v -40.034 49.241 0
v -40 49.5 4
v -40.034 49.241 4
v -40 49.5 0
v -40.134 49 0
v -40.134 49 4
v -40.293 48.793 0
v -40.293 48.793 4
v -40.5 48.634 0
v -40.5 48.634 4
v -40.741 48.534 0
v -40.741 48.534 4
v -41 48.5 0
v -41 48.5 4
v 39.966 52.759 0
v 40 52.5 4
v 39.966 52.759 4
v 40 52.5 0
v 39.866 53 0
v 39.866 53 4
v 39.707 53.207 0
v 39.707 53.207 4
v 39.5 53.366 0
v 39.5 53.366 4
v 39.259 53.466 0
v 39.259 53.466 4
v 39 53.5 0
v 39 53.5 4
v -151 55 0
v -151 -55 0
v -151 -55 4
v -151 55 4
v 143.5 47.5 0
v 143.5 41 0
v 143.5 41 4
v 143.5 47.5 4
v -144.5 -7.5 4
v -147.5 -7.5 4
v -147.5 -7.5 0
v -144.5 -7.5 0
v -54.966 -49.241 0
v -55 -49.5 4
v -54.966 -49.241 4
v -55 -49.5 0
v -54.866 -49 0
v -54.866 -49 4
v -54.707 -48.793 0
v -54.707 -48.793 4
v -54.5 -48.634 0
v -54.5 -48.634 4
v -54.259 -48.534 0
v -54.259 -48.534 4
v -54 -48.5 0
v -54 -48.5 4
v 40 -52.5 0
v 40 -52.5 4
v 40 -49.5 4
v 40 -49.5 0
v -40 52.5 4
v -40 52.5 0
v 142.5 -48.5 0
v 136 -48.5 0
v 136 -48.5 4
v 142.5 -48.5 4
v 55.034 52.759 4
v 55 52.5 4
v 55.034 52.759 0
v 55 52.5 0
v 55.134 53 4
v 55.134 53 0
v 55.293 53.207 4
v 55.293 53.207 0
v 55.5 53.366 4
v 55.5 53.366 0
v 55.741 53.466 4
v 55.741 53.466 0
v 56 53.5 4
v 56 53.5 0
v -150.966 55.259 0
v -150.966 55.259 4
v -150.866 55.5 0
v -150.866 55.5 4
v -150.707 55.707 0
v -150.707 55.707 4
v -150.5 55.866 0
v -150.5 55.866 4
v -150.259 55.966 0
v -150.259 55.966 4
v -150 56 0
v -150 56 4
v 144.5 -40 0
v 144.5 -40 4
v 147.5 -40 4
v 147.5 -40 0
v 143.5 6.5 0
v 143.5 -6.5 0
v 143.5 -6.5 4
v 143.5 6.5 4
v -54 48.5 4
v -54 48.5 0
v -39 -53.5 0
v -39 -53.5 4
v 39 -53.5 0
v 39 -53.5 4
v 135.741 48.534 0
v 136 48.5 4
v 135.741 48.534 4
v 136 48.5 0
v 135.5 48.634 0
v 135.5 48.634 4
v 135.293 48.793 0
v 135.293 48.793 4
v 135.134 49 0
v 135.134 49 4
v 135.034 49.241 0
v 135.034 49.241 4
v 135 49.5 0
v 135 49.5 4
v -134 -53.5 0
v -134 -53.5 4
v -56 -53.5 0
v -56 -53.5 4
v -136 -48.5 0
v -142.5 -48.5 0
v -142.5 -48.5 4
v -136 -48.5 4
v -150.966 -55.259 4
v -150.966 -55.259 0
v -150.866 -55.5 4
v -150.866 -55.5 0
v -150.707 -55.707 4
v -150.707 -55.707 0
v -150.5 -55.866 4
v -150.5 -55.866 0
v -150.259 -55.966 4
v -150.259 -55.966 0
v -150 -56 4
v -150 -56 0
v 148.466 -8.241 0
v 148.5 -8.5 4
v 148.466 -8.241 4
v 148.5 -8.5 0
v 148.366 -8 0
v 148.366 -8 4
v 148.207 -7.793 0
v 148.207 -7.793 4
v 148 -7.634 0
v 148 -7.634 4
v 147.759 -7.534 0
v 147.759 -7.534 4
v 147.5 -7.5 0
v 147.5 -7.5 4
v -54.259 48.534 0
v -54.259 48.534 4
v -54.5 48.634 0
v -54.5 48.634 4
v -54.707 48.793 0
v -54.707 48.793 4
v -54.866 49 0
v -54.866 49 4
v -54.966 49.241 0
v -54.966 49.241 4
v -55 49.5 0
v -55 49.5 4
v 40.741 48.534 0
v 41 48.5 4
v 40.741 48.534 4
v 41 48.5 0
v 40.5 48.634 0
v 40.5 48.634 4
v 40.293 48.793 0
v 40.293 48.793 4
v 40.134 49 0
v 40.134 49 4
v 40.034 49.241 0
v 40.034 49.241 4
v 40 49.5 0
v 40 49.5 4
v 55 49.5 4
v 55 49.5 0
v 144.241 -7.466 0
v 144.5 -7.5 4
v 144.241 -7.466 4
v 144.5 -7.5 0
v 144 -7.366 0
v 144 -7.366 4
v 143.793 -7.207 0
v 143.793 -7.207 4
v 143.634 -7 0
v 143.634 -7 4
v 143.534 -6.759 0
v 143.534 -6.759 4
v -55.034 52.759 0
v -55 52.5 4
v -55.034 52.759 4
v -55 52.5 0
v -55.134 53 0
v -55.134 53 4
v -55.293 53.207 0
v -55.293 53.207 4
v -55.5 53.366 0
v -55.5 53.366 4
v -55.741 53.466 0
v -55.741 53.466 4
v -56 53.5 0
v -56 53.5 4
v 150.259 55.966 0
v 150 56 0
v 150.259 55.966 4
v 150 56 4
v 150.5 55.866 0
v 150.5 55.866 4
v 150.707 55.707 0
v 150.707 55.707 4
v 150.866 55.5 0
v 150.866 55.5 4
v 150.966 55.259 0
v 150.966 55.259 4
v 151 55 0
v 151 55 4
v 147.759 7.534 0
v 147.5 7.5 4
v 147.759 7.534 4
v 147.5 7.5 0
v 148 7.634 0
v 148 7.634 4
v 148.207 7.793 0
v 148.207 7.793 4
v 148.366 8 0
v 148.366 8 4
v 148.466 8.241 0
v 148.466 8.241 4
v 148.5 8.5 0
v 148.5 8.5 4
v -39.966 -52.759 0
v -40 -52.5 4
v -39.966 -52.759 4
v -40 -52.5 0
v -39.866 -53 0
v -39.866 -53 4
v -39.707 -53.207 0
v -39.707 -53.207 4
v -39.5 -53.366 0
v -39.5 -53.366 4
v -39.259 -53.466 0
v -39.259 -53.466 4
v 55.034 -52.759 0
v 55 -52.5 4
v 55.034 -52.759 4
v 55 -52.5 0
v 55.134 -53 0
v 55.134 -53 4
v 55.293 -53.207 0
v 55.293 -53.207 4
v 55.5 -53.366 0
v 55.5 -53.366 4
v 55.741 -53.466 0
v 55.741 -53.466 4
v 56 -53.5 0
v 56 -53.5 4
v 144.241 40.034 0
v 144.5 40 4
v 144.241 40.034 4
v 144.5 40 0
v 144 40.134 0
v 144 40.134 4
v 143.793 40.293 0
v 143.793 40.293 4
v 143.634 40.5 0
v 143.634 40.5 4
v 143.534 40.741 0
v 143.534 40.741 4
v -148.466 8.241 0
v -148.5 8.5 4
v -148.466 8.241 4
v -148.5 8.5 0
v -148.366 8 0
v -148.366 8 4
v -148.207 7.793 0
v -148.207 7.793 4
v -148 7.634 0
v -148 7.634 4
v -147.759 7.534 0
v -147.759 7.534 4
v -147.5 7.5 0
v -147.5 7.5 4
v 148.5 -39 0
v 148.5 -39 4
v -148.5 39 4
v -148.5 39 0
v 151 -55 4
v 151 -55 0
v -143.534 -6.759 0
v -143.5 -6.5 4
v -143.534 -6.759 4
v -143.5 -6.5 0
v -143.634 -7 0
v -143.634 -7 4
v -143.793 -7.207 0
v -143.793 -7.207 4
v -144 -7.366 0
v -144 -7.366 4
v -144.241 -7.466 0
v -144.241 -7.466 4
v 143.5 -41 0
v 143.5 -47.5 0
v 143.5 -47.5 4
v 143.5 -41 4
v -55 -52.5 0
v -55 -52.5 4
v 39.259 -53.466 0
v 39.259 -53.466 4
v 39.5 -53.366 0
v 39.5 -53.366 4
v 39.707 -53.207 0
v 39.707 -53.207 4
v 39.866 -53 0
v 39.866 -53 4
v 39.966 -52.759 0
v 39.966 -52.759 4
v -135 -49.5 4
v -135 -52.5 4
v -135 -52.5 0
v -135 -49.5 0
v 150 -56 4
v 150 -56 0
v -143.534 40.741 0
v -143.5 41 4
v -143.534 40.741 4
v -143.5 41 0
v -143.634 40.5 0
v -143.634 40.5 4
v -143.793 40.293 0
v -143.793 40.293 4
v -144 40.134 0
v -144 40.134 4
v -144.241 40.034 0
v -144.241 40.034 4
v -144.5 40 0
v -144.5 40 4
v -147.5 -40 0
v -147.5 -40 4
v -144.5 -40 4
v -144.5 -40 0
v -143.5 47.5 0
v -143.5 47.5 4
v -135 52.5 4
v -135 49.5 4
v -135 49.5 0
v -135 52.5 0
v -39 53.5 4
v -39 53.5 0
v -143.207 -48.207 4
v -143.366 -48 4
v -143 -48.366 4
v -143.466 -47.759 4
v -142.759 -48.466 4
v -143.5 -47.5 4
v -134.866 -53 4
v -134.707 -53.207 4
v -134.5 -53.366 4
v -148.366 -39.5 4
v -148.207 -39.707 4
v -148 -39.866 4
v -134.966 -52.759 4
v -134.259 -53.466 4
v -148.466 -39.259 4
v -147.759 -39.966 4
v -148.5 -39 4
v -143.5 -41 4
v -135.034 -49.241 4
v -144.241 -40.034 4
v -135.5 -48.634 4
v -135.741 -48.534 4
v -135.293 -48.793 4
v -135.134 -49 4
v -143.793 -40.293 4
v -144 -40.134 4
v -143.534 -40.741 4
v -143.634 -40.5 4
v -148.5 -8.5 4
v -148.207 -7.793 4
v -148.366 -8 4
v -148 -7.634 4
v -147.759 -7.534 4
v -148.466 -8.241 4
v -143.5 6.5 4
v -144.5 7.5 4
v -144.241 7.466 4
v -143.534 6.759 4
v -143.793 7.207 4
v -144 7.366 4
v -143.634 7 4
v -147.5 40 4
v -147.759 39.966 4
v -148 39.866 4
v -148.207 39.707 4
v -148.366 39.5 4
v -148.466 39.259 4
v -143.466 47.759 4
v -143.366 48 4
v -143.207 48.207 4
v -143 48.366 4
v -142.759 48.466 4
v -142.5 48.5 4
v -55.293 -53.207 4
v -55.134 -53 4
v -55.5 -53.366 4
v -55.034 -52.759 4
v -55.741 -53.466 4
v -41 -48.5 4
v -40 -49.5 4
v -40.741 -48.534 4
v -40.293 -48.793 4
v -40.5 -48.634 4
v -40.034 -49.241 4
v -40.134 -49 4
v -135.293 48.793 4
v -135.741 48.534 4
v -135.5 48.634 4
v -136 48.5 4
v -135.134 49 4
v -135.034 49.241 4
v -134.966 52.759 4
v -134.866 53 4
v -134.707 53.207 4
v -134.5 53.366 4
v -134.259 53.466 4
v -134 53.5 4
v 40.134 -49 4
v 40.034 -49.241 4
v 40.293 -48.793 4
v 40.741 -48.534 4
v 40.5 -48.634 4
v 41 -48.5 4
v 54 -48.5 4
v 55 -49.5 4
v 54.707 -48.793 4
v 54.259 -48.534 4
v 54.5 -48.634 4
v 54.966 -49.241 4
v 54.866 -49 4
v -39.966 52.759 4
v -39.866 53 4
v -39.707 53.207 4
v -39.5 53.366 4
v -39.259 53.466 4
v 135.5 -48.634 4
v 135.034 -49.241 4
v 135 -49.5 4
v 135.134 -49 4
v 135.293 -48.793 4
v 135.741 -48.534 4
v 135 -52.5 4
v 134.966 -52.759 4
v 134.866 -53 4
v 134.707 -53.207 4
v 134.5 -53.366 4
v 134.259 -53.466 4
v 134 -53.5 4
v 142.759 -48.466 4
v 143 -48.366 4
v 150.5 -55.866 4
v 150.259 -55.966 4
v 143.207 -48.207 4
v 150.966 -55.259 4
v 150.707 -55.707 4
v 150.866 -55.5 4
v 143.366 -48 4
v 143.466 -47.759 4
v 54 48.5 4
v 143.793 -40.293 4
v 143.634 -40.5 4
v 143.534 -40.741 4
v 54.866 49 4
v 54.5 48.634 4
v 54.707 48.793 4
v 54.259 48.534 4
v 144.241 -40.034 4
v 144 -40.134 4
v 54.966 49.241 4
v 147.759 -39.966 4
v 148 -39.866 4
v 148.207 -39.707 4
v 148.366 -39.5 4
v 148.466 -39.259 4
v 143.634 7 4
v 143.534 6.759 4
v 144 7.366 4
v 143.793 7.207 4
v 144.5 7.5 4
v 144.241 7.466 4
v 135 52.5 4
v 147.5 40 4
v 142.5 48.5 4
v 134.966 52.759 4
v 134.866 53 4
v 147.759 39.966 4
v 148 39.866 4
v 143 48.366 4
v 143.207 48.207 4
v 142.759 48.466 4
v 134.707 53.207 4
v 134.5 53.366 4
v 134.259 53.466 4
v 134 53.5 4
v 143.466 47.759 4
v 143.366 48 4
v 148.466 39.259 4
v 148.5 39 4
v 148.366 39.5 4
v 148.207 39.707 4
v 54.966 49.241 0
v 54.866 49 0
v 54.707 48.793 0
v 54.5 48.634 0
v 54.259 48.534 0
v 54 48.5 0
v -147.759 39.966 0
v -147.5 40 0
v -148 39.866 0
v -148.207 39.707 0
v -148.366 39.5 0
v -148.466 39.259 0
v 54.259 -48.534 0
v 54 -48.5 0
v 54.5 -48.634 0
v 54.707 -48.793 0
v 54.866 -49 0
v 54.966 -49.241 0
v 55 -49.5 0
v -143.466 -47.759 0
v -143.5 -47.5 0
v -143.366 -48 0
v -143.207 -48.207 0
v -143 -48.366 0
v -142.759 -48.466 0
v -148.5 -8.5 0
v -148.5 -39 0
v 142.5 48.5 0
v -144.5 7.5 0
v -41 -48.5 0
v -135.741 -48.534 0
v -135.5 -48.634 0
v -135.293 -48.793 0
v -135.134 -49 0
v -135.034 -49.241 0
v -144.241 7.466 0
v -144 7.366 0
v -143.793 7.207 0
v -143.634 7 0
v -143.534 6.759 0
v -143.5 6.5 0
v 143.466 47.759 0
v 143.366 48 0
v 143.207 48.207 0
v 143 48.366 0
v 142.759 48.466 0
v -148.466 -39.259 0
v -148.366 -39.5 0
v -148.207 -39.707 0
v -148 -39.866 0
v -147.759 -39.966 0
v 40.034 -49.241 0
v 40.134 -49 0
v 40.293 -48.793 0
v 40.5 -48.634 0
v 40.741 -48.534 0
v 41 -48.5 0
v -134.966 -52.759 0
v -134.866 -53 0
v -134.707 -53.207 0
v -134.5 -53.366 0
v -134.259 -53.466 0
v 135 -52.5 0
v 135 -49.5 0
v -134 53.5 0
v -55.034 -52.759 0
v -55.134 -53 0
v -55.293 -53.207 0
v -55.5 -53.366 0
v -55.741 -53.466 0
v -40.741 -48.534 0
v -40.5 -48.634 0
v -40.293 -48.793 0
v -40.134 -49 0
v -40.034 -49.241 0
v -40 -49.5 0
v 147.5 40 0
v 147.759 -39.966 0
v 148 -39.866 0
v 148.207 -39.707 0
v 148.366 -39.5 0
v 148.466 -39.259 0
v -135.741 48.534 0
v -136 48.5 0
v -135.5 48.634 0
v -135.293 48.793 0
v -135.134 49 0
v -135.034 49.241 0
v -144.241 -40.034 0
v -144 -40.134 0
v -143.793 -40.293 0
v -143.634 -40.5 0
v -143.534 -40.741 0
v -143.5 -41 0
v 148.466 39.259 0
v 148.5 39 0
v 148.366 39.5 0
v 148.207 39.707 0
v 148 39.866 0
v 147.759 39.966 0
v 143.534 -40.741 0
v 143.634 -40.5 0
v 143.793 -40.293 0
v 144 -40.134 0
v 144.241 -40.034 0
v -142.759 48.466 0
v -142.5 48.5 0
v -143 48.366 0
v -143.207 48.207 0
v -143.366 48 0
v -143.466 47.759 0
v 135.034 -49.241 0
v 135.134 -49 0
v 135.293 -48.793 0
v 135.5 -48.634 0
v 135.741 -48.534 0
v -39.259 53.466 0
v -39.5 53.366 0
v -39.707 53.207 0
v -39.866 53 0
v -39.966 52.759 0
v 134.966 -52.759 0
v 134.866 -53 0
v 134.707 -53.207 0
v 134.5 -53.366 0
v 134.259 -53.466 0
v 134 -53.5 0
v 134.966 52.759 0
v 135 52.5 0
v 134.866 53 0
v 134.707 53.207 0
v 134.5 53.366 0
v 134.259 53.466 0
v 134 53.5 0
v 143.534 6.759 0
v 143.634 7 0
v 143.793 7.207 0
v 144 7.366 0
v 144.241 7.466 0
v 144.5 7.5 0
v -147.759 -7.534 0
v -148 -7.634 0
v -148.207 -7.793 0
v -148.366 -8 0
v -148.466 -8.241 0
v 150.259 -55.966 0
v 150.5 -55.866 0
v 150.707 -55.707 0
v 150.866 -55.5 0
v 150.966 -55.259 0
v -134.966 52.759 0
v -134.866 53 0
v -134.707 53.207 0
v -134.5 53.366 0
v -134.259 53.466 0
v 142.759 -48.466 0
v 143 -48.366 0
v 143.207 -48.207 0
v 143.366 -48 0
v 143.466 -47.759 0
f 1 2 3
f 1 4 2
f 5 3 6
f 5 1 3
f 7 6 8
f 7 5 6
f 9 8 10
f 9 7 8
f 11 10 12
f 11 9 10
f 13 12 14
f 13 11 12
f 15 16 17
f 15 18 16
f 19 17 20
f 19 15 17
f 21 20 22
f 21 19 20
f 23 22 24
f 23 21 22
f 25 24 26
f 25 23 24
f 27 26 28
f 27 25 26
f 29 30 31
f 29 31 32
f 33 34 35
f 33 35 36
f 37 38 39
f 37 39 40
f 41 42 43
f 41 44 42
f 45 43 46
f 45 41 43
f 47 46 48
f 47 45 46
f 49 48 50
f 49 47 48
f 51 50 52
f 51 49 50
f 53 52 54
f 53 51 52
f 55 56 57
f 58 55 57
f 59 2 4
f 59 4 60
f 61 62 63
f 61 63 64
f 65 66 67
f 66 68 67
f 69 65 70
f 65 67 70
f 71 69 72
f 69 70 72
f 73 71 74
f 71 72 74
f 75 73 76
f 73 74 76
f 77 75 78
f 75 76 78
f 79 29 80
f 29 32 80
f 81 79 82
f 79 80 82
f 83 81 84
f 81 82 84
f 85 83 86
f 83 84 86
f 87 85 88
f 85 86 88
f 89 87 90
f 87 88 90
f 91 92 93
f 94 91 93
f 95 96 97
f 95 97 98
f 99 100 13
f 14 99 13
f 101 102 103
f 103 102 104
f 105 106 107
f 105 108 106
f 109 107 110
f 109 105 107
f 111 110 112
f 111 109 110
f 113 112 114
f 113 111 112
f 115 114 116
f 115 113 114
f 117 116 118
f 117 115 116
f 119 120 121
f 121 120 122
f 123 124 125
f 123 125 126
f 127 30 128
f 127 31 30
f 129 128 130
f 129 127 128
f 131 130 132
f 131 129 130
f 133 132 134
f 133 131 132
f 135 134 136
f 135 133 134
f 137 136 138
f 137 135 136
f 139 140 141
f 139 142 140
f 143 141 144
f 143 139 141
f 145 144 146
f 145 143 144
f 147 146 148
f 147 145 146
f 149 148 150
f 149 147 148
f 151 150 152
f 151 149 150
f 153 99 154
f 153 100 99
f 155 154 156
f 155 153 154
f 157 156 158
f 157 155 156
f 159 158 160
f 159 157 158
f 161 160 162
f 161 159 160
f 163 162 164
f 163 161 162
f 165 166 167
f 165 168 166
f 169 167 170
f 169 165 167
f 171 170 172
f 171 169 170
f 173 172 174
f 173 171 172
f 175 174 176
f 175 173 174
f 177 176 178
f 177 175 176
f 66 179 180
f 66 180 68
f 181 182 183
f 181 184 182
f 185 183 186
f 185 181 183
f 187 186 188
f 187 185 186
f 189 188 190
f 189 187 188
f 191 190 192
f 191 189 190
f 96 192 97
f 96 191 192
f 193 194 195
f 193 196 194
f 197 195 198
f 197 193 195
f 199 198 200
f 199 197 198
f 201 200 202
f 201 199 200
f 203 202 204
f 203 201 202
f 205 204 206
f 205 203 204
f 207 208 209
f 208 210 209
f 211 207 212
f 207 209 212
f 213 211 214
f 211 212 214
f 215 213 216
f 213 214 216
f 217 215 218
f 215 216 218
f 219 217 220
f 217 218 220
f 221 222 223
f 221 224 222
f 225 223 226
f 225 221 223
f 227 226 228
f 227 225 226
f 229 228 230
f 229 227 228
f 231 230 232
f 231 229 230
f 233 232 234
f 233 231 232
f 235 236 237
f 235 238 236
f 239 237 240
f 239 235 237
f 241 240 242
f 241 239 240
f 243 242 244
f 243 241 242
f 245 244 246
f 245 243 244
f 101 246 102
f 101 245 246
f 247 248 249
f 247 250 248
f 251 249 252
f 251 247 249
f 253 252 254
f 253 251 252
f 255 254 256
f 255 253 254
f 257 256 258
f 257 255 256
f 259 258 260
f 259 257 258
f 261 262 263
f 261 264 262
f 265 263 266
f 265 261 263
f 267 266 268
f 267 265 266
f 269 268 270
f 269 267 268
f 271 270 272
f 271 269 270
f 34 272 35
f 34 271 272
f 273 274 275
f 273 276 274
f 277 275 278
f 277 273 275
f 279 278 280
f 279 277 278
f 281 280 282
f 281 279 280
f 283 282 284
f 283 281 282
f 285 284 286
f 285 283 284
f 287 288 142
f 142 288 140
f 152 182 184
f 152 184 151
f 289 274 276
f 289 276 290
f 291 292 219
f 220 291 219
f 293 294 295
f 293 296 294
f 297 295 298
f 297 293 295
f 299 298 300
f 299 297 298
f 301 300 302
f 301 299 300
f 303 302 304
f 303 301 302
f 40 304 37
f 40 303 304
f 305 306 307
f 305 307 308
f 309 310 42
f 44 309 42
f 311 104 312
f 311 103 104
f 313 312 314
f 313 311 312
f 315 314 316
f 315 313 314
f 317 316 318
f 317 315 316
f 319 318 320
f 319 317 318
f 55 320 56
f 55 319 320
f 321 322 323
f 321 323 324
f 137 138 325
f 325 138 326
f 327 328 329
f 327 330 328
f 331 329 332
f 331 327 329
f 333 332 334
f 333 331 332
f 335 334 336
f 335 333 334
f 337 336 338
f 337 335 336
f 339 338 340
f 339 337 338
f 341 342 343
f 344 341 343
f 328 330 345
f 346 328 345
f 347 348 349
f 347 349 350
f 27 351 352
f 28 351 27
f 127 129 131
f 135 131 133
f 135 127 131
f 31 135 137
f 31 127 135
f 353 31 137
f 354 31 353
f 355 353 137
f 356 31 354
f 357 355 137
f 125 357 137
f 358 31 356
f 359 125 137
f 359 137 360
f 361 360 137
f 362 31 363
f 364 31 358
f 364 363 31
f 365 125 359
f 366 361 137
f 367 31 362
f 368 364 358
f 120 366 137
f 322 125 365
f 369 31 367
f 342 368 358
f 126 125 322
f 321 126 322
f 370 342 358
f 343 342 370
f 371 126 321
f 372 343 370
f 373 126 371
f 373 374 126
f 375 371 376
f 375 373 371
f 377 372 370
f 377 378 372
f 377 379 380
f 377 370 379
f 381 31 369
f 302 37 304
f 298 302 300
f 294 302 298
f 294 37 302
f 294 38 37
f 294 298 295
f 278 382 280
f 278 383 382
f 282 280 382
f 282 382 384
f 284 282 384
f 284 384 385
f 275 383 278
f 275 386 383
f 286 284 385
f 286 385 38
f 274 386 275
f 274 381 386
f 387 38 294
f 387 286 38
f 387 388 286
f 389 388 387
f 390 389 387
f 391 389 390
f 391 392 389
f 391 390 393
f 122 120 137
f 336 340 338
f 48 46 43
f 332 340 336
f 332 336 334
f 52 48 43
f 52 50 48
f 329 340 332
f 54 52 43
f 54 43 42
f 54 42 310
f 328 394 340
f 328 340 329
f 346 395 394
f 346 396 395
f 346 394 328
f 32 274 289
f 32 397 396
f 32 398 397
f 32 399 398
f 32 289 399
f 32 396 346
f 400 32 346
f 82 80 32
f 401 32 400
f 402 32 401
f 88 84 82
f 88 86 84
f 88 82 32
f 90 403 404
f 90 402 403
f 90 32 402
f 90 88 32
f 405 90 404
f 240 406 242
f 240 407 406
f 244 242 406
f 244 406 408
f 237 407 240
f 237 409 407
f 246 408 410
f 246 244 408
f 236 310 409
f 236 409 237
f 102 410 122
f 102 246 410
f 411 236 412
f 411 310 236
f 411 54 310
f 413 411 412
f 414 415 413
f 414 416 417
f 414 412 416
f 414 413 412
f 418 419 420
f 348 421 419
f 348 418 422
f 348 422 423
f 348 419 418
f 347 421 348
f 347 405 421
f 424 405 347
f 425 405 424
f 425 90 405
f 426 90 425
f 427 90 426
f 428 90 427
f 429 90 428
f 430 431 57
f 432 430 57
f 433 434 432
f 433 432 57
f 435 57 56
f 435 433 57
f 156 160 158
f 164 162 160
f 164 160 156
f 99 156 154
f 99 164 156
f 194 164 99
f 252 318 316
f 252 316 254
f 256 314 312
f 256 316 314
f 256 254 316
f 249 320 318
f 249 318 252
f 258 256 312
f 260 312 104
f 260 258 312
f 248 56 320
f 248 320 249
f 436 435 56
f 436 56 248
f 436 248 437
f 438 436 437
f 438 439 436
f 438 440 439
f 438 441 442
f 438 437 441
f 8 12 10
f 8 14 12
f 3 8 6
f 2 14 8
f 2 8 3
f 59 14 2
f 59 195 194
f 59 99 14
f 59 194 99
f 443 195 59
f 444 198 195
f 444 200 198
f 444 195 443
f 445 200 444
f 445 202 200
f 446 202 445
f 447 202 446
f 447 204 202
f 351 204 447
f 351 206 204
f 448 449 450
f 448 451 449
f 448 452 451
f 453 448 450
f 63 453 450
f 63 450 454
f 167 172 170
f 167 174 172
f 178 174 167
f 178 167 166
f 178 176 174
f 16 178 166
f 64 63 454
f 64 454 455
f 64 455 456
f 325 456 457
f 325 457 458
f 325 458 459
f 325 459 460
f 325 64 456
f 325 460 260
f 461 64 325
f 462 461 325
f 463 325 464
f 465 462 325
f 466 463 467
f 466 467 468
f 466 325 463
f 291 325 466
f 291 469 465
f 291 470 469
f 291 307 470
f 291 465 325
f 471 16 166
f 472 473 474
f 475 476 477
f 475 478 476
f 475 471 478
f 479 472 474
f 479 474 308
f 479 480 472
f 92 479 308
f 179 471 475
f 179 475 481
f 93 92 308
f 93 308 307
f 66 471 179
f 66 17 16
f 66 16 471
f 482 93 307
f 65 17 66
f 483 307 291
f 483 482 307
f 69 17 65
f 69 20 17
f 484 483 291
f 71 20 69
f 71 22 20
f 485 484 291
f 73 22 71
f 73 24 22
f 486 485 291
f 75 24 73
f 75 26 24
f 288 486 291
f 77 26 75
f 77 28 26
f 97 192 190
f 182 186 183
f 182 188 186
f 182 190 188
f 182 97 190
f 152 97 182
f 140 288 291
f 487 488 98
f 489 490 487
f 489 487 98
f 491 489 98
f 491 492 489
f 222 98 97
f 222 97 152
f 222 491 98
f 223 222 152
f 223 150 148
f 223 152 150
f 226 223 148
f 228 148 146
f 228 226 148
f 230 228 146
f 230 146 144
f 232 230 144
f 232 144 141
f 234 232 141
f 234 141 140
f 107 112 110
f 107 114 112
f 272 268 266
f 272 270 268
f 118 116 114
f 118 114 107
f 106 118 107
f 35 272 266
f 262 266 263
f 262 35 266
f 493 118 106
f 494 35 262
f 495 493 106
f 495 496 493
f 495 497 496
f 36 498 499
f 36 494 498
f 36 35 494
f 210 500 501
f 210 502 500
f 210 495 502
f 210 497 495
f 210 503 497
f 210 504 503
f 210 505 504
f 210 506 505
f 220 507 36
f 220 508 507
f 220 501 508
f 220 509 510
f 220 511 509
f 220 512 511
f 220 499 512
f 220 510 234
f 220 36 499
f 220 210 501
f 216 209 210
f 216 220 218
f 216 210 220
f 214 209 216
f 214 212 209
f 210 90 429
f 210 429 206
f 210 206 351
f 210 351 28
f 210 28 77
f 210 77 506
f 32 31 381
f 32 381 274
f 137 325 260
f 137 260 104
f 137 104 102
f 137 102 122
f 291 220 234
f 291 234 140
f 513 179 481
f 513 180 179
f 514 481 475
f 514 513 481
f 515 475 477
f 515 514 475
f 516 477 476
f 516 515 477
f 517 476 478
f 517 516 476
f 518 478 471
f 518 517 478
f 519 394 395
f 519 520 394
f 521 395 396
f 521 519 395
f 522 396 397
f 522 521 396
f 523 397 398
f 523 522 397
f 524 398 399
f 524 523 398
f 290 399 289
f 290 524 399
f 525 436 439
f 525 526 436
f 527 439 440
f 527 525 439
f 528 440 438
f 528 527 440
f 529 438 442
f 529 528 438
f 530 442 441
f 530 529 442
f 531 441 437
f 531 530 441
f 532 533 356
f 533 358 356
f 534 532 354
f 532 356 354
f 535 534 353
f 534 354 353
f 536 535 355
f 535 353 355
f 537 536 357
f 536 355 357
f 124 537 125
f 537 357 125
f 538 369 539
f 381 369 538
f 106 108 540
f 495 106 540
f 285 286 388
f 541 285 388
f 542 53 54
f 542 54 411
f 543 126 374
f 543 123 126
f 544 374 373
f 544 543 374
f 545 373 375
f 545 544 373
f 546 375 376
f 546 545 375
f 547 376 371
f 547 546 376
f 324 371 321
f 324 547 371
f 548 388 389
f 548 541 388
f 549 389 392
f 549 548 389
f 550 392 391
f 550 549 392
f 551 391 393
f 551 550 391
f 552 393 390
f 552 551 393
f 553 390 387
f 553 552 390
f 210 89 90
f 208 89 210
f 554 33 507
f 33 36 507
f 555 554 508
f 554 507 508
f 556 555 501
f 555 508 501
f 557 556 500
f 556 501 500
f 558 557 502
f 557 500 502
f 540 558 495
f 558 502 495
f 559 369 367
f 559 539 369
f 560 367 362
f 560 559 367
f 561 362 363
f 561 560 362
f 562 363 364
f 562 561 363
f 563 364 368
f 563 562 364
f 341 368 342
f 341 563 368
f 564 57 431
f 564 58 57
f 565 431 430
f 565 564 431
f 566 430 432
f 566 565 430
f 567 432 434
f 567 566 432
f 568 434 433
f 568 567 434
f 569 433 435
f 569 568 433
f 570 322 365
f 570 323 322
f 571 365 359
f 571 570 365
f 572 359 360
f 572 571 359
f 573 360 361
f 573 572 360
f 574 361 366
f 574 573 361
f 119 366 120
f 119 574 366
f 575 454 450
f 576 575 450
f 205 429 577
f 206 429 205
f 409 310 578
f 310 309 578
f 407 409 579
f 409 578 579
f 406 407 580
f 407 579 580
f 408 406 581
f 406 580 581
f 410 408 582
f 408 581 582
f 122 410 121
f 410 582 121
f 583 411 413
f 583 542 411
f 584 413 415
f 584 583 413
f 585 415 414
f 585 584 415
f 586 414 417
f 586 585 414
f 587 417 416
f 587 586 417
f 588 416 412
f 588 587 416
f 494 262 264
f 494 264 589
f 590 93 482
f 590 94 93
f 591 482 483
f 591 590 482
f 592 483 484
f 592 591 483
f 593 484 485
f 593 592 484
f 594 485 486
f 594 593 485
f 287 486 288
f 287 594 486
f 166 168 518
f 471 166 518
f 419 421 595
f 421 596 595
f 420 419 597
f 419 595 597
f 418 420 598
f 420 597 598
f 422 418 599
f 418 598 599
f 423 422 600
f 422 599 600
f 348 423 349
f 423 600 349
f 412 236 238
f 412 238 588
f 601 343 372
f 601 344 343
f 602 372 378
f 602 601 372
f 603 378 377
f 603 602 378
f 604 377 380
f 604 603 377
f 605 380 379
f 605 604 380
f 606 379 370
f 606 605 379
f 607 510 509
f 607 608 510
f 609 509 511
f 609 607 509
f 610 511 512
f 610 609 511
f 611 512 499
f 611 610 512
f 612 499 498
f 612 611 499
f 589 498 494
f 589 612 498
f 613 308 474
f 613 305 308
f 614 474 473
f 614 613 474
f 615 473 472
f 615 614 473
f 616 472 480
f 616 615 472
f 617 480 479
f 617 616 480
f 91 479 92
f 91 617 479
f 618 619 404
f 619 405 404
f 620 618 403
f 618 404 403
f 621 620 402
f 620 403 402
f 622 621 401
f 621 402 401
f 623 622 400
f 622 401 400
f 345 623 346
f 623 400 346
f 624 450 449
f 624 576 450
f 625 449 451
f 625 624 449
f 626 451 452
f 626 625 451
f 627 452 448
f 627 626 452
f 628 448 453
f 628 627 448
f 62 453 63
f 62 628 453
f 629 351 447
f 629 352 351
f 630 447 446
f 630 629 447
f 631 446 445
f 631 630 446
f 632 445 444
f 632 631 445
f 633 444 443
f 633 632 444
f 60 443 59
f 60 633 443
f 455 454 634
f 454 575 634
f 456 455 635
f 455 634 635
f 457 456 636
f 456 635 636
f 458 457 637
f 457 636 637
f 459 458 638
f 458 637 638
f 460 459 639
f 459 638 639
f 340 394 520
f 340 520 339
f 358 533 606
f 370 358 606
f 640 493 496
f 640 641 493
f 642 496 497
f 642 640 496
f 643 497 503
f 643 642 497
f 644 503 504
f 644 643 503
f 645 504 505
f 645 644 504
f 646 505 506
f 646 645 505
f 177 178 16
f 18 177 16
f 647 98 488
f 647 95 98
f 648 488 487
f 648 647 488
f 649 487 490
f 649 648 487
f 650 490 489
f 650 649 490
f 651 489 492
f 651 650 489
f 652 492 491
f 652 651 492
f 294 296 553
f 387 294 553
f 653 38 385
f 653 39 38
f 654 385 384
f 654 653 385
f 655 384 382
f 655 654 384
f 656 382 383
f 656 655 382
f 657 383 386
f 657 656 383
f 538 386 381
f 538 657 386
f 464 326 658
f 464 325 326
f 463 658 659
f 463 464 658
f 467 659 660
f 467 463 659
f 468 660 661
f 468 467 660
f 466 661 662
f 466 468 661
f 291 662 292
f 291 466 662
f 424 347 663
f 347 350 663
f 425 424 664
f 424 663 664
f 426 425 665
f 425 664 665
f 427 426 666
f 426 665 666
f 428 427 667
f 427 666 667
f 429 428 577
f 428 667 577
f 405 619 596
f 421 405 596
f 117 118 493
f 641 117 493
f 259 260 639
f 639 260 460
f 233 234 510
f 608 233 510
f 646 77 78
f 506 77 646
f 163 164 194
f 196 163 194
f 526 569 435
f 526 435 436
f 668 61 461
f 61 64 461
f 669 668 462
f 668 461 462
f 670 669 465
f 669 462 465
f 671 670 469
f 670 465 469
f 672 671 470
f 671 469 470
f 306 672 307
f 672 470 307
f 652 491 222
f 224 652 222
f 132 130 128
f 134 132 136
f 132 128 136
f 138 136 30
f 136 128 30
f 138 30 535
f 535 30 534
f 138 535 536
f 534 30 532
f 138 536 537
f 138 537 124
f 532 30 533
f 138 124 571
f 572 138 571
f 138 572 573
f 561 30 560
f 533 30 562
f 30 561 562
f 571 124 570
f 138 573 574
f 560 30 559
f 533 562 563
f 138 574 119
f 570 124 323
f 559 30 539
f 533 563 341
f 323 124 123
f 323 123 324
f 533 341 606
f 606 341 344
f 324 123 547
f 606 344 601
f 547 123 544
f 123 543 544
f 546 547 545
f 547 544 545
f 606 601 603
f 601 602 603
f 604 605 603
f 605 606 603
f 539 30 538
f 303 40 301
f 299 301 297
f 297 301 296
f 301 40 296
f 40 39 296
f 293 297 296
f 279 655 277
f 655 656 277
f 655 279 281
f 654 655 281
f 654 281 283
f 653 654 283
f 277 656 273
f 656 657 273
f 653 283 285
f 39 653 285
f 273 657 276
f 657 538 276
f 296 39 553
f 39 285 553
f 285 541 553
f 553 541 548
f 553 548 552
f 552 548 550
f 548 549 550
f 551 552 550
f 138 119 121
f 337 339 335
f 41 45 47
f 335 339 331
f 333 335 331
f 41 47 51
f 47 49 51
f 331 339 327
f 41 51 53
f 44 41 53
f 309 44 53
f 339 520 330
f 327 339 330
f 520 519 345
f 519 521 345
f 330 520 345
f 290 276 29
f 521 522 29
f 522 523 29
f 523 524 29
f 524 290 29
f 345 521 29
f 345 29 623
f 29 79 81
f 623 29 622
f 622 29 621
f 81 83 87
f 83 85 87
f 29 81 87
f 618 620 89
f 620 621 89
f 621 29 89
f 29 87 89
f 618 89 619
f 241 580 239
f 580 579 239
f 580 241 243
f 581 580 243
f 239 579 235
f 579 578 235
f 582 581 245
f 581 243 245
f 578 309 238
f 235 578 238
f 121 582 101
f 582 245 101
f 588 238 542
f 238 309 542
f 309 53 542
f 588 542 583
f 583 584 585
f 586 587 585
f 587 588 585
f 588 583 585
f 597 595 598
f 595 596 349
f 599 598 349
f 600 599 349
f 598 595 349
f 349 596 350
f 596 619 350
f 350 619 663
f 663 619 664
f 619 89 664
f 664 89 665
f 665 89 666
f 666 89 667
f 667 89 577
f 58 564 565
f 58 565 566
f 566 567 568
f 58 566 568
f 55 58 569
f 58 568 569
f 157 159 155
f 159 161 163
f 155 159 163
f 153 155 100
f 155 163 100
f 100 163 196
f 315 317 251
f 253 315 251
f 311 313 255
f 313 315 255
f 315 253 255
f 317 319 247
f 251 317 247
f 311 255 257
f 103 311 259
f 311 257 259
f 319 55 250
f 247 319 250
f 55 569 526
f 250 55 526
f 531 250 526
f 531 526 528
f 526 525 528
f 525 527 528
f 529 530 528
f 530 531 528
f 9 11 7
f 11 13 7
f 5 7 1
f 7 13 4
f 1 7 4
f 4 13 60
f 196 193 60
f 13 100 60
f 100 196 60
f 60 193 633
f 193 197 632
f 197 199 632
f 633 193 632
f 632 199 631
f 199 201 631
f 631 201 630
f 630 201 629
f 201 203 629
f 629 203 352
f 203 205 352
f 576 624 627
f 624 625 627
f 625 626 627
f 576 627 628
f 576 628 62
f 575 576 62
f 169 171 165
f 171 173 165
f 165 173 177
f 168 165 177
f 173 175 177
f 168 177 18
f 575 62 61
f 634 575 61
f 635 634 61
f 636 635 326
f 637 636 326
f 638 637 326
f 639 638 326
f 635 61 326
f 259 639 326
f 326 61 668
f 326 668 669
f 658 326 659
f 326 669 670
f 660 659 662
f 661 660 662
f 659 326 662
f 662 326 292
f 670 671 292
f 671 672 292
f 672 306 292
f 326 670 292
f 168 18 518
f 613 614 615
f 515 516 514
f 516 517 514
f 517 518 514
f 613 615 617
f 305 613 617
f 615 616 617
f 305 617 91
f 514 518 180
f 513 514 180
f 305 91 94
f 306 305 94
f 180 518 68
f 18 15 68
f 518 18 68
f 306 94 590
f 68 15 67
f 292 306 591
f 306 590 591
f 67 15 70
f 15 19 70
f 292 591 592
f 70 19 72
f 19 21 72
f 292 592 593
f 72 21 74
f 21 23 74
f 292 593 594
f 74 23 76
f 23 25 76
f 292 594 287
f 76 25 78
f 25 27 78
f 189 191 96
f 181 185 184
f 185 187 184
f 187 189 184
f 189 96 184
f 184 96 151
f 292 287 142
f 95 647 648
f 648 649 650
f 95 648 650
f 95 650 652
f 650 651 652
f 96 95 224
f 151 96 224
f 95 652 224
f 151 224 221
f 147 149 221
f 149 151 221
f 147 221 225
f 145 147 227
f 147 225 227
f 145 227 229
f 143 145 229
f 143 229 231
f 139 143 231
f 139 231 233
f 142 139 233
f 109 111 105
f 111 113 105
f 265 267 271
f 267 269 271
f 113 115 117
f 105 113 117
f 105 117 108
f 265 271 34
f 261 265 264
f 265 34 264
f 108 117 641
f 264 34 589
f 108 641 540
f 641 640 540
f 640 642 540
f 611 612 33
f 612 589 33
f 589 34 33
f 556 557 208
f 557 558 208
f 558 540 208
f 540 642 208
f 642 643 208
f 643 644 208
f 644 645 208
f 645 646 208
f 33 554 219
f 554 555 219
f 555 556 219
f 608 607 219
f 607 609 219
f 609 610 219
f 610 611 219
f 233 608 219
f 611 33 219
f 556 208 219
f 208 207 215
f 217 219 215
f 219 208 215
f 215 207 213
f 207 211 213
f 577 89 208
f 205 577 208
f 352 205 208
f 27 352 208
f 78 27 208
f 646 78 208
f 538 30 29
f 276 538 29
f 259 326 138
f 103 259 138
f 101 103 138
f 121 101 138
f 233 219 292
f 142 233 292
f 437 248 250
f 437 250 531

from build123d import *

# Parameters (mm, degrees)
SKETCH_W      = 302
SKETCH_H      = 112
SKETCH_W_2    = 287
SKETCH_H_2    = 97
PAD_DEPTH     = 4
SKETCH001_W   = 80
SKETCH001_H   = 5
SKETCH001_W_2 = 5
SKETCH001_H_2 = 32.5
POCKET_DEPTH  = 5
FILLET_R      = 1
FILLET001_R   = 1
FILLET002_R   = 1
FILLET003_R   = 1
FILLET004_R   = 1
FILLET005_R   = 1
FILLET006_R   = 1
FILLET007_R   = 1
FILLET008_R   = 1
FILLET009_R   = 1
FILLET010_R   = 1
FILLET011_R   = 1
FILLET012_R   = 1
FILLET013_R   = 1
FILLET014_R   = 1
FILLET015_R   = 1
FILLET016_R   = 1
FILLET017_R   = 1
FILLET018_R   = 1
FILLET019_R   = 1
FILLET020_R   = 1
FILLET021_R   = 1
FILLET022_R   = 1
FILLET023_R   = 1
FILLET024_R   = 1
FILLET025_R   = 1
FILLET026_R   = 1
FILLET027_R   = 1
FILLET028_R   = 1
FILLET029_R   = 1
FILLET030_R   = 1
FILLET031_R   = 1
FILLET032_R   = 1
FILLET033_R   = 1
FILLET034_R   = 1
FILLET035_R   = 1
FILLET036_R   = 1
FILLET037_R   = 1
FILLET038_R   = 1
FILLET039_R   = 1
FILLET040_R   = 1
FILLET041_R   = 1
FILLET042_R   = 1
FILLET043_R   = 1
FILLET044_R   = 1
FILLET045_R   = 1
FILLET046_R   = 1
FILLET047_R   = 1


with BuildPart() as part:
    # Sketch → Pad (new body)
    with BuildSketch(Plane.XY):
        Rectangle(SKETCH_W, SKETCH_H)
        Rectangle(SKETCH_W_2, SKETCH_H_2, mode=Mode.SUBTRACT)
    extrude(amount=PAD_DEPTH)

    # Sketch001 (on Face10 of Pad) → Pocket (cut)
    with BuildSketch(Plane.XY.offset(4)):
        with Locations((0, 51)):
            Rectangle(SKETCH001_W, SKETCH001_H)
        with Locations((0, -51)):
            Rectangle(SKETCH001_W, SKETCH001_H)
        with Locations((-95, -51)):
            Rectangle(SKETCH001_W, SKETCH001_H)
        with Locations((-95, 51)):
            Rectangle(SKETCH001_W, SKETCH001_H)
        with Locations((95, 51)):
            Rectangle(SKETCH001_W, SKETCH001_H)
        with Locations((95, -51)):
            Rectangle(SKETCH001_W, SKETCH001_H)
        with Locations((-146, 23.75)):
            Rectangle(SKETCH001_W_2, SKETCH001_H_2)
        with Locations((-146, -23.75)):
            Rectangle(SKETCH001_W_2, SKETCH001_H_2)
        with Locations((146, 23.75)):
            Rectangle(SKETCH001_W_2, SKETCH001_H_2)
        with Locations((146, -23.75)):
            Rectangle(SKETCH001_W_2, SKETCH001_H_2)
    extrude(amount=-POCKET_DEPTH, mode=Mode.SUBTRACT)

    # Fillet
    fillet_edges = [part.edges().sort_by_distance(p)[0] for p in [
        (-151, -56, 2),
    ]]
    fillet(fillet_edges, radius=FILLET_R)

    # Fillet001
    fillet001_edges = [part.edges().sort_by_distance(p)[0] for p in [
        (-143.5, -7.5, 2),
    ]]
    fillet(fillet001_edges, radius=FILLET001_R)

    # Fillet002
    fillet002_edges = [part.edges().sort_by_distance(p)[0] for p in [
        (-55, -48.5, 2),
    ]]
    fillet(fillet002_edges, radius=FILLET002_R)

    # Fillet003
    fillet003_edges = [part.edges().sort_by_distance(p)[0] for p in [
        (40, -48.5, 2),
    ]]
    fillet(fillet003_edges, radius=FILLET003_R)

    # Fillet004
    fillet004_edges = [part.edges().sort_by_distance(p)[0] for p in [
        (135, -48.5, 2),
    ]]
    fillet(fillet004_edges, radius=FILLET004_R)

    # Fillet005
    fillet005_edges = [part.edges().sort_by_distance(p)[0] for p in [
        (143.5, -40, 2),
    ]]
    fillet(fillet005_edges, radius=FILLET005_R)

    # Fillet006
    fillet006_edges = [part.edges().sort_by_distance(p)[0] for p in [
        (151, -56, 2),
    ]]
    fillet(fillet006_edges, radius=FILLET006_R)

    # Fillet007
    fillet007_edges = [part.edges().sort_by_distance(p)[0] for p in [
        (148.5, -7.5, 2),
    ]]
    fillet(fillet007_edges, radius=FILLET007_R)

    # Fillet008
    fillet008_edges = [part.edges().sort_by_distance(p)[0] for p in [
        (143.5, -7.5, 2),
    ]]
    fillet(fillet008_edges, radius=FILLET008_R)

    # Fillet009
    fillet009_edges = [part.edges().sort_by_distance(p)[0] for p in [
        (143.5, 7.5, 2),
    ]]
    fillet(fillet009_edges, radius=FILLET009_R)

    # Fillet010
    fillet010_edges = [part.edges().sort_by_distance(p)[0] for p in [
        (148.5, 40, 2),
    ]]
    fillet(fillet010_edges, radius=FILLET010_R)

    # Fillet011
    fillet011_edges = [part.edges().sort_by_distance(p)[0] for p in [
        (143.5, 40, 2),
    ]]
    fillet(fillet011_edges, radius=FILLET011_R)

    # Fillet012
    fillet012_edges = [part.edges().sort_by_distance(p)[0] for p in [
        (143.5, 48.5, 2),
    ]]
    fillet(fillet012_edges, radius=FILLET012_R)

    # Fillet013
    fillet013_edges = [part.edges().sort_by_distance(p)[0] for p in [
        (135, 48.5, 2),
    ]]
    fillet(fillet013_edges, radius=FILLET013_R)

    # Fillet014
    fillet014_edges = [part.edges().sort_by_distance(p)[0] for p in [
        (135, 53.5, 2),
    ]]
    fillet(fillet014_edges, radius=FILLET014_R)

    # Fillet015
    fillet015_edges = [part.edges().sort_by_distance(p)[0] for p in [
        (55, 48.5, 2),
    ]]
    fillet(fillet015_edges, radius=FILLET015_R)

    # Fillet016
    fillet016_edges = [part.edges().sort_by_distance(p)[0] for p in [
        (40, 48.5, 2),
    ]]
    fillet(fillet016_edges, radius=FILLET016_R)

    # Fillet017
    fillet017_edges = [part.edges().sort_by_distance(p)[0] for p in [
        (40, 53.5, 2),
    ]]
    fillet(fillet017_edges, radius=FILLET017_R)

    # Fillet018
    fillet018_edges = [part.edges().sort_by_distance(p)[0] for p in [
        (-40, 48.5, 2),
    ]]
    fillet(fillet018_edges, radius=FILLET018_R)

    # Fillet019
    fillet019_edges = [part.edges().sort_by_distance(p)[0] for p in [
        (-55, 48.5, 2),
    ]]
    fillet(fillet019_edges, radius=FILLET019_R)

    # Fillet020
    fillet020_edges = [part.edges().sort_by_distance(p)[0] for p in [
        (-55, 53.5, 2),
    ]]
    fillet(fillet020_edges, radius=FILLET020_R)

    # Fillet021
    fillet021_edges = [part.edges().sort_by_distance(p)[0] for p in [
        (-143.5, 40, 2),
    ]]
    fillet(fillet021_edges, radius=FILLET021_R)

    # Fillet022
    fillet022_edges = [part.edges().sort_by_distance(p)[0] for p in [
        (-135, 48.5, 2),
    ]]
    fillet(fillet022_edges, radius=FILLET022_R)

    # Fillet023
    fillet023_edges = [part.edges().sort_by_distance(p)[0] for p in [
        (-151, 56, 2),
    ]]
    fillet(fillet023_edges, radius=FILLET023_R)

    # Fillet024
    fillet024_edges = [part.edges().sort_by_distance(p)[0] for p in [
        (-143.5, 48.5, 2),
    ]]
    fillet(fillet024_edges, radius=FILLET024_R)

    # Fillet025
    fillet025_edges = [part.edges().sort_by_distance(p)[0] for p in [
        (-135, 53.5, 2),
    ]]
    fillet(fillet025_edges, radius=FILLET025_R)

    # Fillet026
    fillet026_edges = [part.edges().sort_by_distance(p)[0] for p in [
        (-148.5, 40, 2),
    ]]
    fillet(fillet026_edges, radius=FILLET026_R)

    # Fillet027
    fillet027_edges = [part.edges().sort_by_distance(p)[0] for p in [
        (-148.5, -7.5, 2),
    ]]
    fillet(fillet027_edges, radius=FILLET027_R)

    # Fillet028
    fillet028_edges = [part.edges().sort_by_distance(p)[0] for p in [
        (-143.5, -40, 2),
    ]]
    fillet(fillet028_edges, radius=FILLET028_R)

    # Fillet029
    fillet029_edges = [part.edges().sort_by_distance(p)[0] for p in [
        (-135, -48.5, 2),
    ]]
    fillet(fillet029_edges, radius=FILLET029_R)

    # Fillet030
    fillet030_edges = [part.edges().sort_by_distance(p)[0] for p in [
        (55, 53.5, 2),
    ]]
    fillet(fillet030_edges, radius=FILLET030_R)

    # Fillet031
    fillet031_edges = [part.edges().sort_by_distance(p)[0] for p in [
        (-40, 53.5, 2),
    ]]
    fillet(fillet031_edges, radius=FILLET031_R)

    # Fillet032
    fillet032_edges = [part.edges().sort_by_distance(p)[0] for p in [
        (-148.5, 7.5, 2),
    ]]
    fillet(fillet032_edges, radius=FILLET032_R)

    # Fillet033
    fillet033_edges = [part.edges().sort_by_distance(p)[0] for p in [
        (-143.5, 7.5, 2),
    ]]
    fillet(fillet033_edges, radius=FILLET033_R)

    # Fillet034
    fillet034_edges = [part.edges().sort_by_distance(p)[0] for p in [
        (-148.5, -40, 2),
    ]]
    fillet(fillet034_edges, radius=FILLET034_R)

    # Fillet035
    fillet035_edges = [part.edges().sort_by_distance(p)[0] for p in [
        (-143.5, -48.5, 2),
    ]]
    fillet(fillet035_edges, radius=FILLET035_R)

    # Fillet036
    fillet036_edges = [part.edges().sort_by_distance(p)[0] for p in [
        (-135, -53.5, 2),
    ]]
    fillet(fillet036_edges, radius=FILLET036_R)

    # Fillet037
    fillet037_edges = [part.edges().sort_by_distance(p)[0] for p in [
        (-40, -48.5, 2),
    ]]
    fillet(fillet037_edges, radius=FILLET037_R)

    # Fillet038
    fillet038_edges = [part.edges().sort_by_distance(p)[0] for p in [
        (-40, -53.5, 2),
    ]]
    fillet(fillet038_edges, radius=FILLET038_R)

    # Fillet039
    fillet039_edges = [part.edges().sort_by_distance(p)[0] for p in [
        (55, -48.5, 2),
    ]]
    fillet(fillet039_edges, radius=FILLET039_R)

    # Fillet040
    fillet040_edges = [part.edges().sort_by_distance(p)[0] for p in [
        (55, -53.5, 2),
    ]]
    fillet(fillet040_edges, radius=FILLET040_R)

    # Fillet041
    fillet041_edges = [part.edges().sort_by_distance(p)[0] for p in [
        (-55, -53.5, 2),
    ]]
    fillet(fillet041_edges, radius=FILLET041_R)

    # Fillet042
    fillet042_edges = [part.edges().sort_by_distance(p)[0] for p in [
        (40, -53.5, 2),
    ]]
    fillet(fillet042_edges, radius=FILLET042_R)

    # Fillet043
    fillet043_edges = [part.edges().sort_by_distance(p)[0] for p in [
        (151, 56, 2),
    ]]
    fillet(fillet043_edges, radius=FILLET043_R)

    # Fillet044
    fillet044_edges = [part.edges().sort_by_distance(p)[0] for p in [
        (143.5, -48.5, 2),
    ]]
    fillet(fillet044_edges, radius=FILLET044_R)

    # Fillet045
    fillet045_edges = [part.edges().sort_by_distance(p)[0] for p in [
        (135, -53.5, 2),
    ]]
    fillet(fillet045_edges, radius=FILLET045_R)

    # Fillet046
    fillet046_edges = [part.edges().sort_by_distance(p)[0] for p in [
        (148.5, -40, 2),
    ]]
    fillet(fillet046_edges, radius=FILLET046_R)

    # Fillet047
    fillet047_edges = [part.edges().sort_by_distance(p)[0] for p in [
        (148.5, 7.5, 2),
    ]]
    fillet(fillet047_edges, radius=FILLET047_R)


solid = part.part
